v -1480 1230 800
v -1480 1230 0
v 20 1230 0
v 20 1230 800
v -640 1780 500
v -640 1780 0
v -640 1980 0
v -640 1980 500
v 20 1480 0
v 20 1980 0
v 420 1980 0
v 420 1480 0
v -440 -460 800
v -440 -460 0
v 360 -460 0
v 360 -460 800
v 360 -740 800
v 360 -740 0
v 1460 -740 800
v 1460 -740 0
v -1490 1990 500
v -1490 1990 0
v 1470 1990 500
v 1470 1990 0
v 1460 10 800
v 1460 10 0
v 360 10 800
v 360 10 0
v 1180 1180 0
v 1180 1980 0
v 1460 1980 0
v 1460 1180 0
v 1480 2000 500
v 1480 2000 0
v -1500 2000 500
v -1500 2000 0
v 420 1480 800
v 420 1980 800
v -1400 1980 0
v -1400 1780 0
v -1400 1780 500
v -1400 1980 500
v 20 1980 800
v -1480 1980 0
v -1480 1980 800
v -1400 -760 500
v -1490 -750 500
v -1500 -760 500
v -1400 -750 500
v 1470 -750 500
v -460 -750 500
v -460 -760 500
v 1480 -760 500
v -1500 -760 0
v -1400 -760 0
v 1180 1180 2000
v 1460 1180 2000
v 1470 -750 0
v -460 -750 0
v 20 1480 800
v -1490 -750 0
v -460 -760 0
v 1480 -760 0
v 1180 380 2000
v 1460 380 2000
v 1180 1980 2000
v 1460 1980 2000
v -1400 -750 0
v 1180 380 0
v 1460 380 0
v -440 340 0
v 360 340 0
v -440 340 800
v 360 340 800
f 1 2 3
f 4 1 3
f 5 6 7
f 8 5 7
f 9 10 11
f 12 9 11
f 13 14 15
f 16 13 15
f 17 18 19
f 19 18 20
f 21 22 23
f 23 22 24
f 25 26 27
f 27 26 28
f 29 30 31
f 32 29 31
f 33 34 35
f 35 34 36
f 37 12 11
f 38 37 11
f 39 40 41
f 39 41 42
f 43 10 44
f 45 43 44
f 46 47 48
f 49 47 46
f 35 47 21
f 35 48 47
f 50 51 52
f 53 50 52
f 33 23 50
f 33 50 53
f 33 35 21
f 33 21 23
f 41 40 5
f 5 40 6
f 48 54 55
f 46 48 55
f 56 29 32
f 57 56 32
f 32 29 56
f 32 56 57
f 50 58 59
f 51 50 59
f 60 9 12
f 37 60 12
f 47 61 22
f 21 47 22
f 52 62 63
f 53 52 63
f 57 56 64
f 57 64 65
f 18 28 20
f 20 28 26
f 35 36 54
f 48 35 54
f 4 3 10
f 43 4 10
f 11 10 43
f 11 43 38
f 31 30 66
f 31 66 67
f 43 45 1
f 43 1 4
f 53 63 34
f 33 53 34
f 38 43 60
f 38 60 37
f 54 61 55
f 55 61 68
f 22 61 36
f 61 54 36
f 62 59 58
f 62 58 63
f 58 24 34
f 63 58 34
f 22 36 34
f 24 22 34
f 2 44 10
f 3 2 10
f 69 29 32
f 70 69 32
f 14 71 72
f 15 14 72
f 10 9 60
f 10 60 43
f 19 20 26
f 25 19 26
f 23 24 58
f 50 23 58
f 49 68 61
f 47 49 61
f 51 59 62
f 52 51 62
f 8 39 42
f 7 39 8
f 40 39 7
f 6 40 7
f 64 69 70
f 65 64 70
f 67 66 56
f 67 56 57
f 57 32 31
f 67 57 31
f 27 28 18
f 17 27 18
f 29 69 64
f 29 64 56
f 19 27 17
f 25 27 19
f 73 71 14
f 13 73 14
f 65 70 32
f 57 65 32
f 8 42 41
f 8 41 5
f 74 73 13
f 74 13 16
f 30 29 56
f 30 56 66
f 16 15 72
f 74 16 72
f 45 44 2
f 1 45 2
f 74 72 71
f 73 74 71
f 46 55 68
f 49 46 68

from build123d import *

# Parameters (mm, degrees)
F1_DEPTH = 500
F0_W     = 280
F0_H     = 800
F2_DEPTH = 2000
F0_W_2   = 760
F0_H_2   = 200
F3_DEPTH = 500
F4_DEPTH = 800
F5_DEPTH = 800
F6_DEPTH = 800
F7_DEPTH = 2000
F0_W_3   = 400
F0_H_3   = 500
F8_DEPTH = 800


with BuildPart() as f1:
    # F0 (on Top) → F1 (new body)
    with BuildSketch(Plane.XY):
        Polygon((-1490, -750), (-1490, 1990), (1470, 1990), (1470, -750), (-460, -750), (-460, -760), (1480, -760), (1480, 2000), (-1500, 2000), (-1500, -760), (-1400, -760), (-1400, -750), align=None)
    extrude(amount=F1_DEPTH)


with BuildPart() as f2:
    # F0 (on Top) → F2 (new body)
    with BuildSketch(Plane.XY):
        with Locations((1320, 780)):
            Rectangle(F0_W, F0_H)
    extrude(amount=F2_DEPTH)


with BuildPart() as f3:
    # F0 (on Top) → F3 (new body)
    with BuildSketch(Plane.XY):
        with Locations((-1020, 1880)):
            Rectangle(F0_W_2, F0_H_2)
    extrude(amount=F3_DEPTH)


with BuildPart() as f4:
    # F0 (on Top) → F4 (new body)
    with BuildSketch(Plane.XY):
        with Locations((-1020, 1880)):
            Rectangle(F0_W_2, F0_H_2)
        Polygon((-1400, 1780), (-1400, 1980), (-1480, 1980), (-1480, 1230), (20, 1230), (20, 1480), (20, 1980), (-640, 1980), (-640, 1780), align=None)
    extrude(amount=F4_DEPTH)


with BuildPart() as f5:
    # F0 (on Top) → F5 (new body)
    with BuildSketch(Plane.XY):
        Polygon((360, -460), (360, 10), (360, 340), (-440, 340), (-440, -460), align=None)
    extrude(amount=F5_DEPTH)


with BuildPart() as f6:
    # F0 (on Top) → F6 (new body)
    with BuildSketch(Plane.XY):
        Polygon((1460, 10), (360, 10), (360, -460), (360, -740), (1460, -740), align=None)
    extrude(amount=F6_DEPTH)


with BuildPart() as f7:
    # F0 (on Top) → F7 (new body)
    with BuildSketch(Plane.XY):
        with Locations((1320, 1580)):
            Rectangle(F0_W, F0_H)
    extrude(amount=F7_DEPTH)


with BuildPart() as f8:
    # F0 (on Top) → F8 (new body)
    with BuildSketch(Plane.XY):
        with Locations((220, 1730)):
            Rectangle(F0_W_3, F0_H_3)
    extrude(amount=F8_DEPTH)


solid = Compound([f1.part, f2.part, f3.part, f4.part, f5.part, f6.part, f7.part, f8.part])
